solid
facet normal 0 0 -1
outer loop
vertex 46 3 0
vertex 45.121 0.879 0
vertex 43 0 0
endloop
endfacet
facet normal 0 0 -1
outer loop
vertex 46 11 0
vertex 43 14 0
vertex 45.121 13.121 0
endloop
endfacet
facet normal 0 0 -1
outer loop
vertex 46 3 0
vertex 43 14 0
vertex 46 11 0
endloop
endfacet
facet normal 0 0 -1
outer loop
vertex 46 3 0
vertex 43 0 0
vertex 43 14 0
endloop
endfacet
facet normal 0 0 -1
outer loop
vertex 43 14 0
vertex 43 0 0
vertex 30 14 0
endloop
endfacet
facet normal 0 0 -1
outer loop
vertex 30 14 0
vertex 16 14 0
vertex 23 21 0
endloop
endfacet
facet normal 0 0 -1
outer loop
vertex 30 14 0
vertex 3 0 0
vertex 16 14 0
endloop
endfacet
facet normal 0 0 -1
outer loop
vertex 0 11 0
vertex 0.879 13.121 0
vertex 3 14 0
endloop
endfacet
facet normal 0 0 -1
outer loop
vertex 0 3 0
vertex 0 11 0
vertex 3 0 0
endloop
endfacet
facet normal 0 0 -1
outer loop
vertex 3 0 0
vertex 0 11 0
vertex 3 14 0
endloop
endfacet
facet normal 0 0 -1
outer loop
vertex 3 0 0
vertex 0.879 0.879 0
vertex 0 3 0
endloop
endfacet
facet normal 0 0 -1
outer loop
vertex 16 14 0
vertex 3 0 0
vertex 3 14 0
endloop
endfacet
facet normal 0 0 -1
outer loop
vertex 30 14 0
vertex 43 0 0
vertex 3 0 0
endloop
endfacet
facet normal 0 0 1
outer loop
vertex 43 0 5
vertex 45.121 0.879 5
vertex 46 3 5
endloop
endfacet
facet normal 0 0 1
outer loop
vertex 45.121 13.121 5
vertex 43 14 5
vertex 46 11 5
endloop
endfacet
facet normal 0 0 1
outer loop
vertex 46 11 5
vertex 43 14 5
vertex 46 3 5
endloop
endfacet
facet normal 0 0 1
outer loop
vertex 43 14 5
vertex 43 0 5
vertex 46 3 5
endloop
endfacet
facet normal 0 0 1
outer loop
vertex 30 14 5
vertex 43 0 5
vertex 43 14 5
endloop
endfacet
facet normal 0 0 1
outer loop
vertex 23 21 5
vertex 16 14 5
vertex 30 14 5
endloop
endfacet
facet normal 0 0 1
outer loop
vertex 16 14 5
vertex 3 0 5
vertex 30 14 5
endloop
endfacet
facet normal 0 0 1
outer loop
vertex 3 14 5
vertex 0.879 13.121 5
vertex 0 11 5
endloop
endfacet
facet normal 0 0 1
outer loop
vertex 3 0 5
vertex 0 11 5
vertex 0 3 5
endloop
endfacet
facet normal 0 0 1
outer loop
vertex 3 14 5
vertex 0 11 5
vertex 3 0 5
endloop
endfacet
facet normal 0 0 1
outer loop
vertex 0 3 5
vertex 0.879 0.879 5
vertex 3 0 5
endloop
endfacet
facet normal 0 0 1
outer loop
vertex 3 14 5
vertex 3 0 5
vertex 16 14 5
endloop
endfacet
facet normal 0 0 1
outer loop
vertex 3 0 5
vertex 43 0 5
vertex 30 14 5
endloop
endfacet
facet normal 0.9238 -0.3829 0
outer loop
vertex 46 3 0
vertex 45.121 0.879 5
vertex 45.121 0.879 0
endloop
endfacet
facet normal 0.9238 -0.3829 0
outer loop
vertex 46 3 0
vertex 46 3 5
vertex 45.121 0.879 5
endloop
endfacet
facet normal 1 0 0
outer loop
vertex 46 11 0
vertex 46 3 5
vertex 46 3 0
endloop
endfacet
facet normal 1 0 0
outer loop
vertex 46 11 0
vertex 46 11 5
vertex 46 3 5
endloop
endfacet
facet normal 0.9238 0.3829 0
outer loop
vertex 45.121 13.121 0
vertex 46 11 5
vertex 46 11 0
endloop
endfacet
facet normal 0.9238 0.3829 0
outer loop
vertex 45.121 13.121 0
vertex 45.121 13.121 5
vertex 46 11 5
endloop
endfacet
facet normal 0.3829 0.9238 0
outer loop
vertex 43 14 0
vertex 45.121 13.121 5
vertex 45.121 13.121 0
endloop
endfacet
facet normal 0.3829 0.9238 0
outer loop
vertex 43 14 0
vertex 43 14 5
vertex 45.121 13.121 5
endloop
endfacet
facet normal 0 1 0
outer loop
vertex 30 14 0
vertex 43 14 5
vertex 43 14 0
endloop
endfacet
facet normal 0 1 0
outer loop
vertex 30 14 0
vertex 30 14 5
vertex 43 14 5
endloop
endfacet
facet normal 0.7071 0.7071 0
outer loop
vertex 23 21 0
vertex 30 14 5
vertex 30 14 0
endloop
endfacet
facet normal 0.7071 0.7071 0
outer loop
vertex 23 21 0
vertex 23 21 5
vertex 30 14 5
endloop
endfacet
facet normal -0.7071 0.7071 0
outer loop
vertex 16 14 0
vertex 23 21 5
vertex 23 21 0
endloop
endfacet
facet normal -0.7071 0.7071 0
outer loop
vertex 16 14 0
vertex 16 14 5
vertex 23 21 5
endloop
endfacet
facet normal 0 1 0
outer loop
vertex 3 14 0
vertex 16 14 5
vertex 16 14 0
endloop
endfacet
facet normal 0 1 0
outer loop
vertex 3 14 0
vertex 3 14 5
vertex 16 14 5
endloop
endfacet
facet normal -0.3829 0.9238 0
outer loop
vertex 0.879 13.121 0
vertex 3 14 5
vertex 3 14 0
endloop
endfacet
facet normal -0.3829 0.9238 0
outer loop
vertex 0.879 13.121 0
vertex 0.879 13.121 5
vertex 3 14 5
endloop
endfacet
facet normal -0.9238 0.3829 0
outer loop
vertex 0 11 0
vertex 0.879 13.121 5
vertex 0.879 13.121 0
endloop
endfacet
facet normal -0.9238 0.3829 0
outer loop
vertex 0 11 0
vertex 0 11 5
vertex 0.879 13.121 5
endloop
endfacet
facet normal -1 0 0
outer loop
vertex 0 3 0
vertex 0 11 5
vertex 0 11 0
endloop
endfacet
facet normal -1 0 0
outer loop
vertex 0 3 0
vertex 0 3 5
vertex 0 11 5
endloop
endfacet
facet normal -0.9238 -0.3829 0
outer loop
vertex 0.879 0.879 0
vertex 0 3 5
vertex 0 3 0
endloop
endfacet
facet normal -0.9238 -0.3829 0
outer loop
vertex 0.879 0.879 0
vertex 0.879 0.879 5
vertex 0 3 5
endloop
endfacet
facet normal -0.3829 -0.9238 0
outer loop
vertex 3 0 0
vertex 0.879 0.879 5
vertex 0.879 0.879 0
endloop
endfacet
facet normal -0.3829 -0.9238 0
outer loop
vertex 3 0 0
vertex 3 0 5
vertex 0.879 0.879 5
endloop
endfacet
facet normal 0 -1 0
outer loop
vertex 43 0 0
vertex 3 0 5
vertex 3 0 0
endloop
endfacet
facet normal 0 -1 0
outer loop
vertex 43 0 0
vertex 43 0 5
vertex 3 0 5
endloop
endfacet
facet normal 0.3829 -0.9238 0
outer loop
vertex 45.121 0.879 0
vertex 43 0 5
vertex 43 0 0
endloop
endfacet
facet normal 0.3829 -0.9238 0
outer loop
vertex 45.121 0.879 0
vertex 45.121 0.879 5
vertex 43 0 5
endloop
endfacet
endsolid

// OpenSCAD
$fn = 32;

// ----------------------------------------------------------------------
// Ratchet pawl: 46 x 14 mm body, beak 7 mm сверху
// ----------------------------------------------------------------------

// --- parameters (mm) ---
profile_height = 5;       // extrusion height
profile_points = 15;      // points of the closed outline

profile = [[0, 3], [0.879, 0.879], [3, 0], [43, 0], [45.121, 0.879], [46, 3], [46, 11], [45.121, 13.121], [43, 14], [30, 14], [23, 21], [16, 14], [3, 14], [0.879, 13.121], [0, 11]];  // single closed polygon, 15 points, counter clockwise

// --- the one profile operation ---
linear_extrude(height = profile_height) polygon(points = profile);
